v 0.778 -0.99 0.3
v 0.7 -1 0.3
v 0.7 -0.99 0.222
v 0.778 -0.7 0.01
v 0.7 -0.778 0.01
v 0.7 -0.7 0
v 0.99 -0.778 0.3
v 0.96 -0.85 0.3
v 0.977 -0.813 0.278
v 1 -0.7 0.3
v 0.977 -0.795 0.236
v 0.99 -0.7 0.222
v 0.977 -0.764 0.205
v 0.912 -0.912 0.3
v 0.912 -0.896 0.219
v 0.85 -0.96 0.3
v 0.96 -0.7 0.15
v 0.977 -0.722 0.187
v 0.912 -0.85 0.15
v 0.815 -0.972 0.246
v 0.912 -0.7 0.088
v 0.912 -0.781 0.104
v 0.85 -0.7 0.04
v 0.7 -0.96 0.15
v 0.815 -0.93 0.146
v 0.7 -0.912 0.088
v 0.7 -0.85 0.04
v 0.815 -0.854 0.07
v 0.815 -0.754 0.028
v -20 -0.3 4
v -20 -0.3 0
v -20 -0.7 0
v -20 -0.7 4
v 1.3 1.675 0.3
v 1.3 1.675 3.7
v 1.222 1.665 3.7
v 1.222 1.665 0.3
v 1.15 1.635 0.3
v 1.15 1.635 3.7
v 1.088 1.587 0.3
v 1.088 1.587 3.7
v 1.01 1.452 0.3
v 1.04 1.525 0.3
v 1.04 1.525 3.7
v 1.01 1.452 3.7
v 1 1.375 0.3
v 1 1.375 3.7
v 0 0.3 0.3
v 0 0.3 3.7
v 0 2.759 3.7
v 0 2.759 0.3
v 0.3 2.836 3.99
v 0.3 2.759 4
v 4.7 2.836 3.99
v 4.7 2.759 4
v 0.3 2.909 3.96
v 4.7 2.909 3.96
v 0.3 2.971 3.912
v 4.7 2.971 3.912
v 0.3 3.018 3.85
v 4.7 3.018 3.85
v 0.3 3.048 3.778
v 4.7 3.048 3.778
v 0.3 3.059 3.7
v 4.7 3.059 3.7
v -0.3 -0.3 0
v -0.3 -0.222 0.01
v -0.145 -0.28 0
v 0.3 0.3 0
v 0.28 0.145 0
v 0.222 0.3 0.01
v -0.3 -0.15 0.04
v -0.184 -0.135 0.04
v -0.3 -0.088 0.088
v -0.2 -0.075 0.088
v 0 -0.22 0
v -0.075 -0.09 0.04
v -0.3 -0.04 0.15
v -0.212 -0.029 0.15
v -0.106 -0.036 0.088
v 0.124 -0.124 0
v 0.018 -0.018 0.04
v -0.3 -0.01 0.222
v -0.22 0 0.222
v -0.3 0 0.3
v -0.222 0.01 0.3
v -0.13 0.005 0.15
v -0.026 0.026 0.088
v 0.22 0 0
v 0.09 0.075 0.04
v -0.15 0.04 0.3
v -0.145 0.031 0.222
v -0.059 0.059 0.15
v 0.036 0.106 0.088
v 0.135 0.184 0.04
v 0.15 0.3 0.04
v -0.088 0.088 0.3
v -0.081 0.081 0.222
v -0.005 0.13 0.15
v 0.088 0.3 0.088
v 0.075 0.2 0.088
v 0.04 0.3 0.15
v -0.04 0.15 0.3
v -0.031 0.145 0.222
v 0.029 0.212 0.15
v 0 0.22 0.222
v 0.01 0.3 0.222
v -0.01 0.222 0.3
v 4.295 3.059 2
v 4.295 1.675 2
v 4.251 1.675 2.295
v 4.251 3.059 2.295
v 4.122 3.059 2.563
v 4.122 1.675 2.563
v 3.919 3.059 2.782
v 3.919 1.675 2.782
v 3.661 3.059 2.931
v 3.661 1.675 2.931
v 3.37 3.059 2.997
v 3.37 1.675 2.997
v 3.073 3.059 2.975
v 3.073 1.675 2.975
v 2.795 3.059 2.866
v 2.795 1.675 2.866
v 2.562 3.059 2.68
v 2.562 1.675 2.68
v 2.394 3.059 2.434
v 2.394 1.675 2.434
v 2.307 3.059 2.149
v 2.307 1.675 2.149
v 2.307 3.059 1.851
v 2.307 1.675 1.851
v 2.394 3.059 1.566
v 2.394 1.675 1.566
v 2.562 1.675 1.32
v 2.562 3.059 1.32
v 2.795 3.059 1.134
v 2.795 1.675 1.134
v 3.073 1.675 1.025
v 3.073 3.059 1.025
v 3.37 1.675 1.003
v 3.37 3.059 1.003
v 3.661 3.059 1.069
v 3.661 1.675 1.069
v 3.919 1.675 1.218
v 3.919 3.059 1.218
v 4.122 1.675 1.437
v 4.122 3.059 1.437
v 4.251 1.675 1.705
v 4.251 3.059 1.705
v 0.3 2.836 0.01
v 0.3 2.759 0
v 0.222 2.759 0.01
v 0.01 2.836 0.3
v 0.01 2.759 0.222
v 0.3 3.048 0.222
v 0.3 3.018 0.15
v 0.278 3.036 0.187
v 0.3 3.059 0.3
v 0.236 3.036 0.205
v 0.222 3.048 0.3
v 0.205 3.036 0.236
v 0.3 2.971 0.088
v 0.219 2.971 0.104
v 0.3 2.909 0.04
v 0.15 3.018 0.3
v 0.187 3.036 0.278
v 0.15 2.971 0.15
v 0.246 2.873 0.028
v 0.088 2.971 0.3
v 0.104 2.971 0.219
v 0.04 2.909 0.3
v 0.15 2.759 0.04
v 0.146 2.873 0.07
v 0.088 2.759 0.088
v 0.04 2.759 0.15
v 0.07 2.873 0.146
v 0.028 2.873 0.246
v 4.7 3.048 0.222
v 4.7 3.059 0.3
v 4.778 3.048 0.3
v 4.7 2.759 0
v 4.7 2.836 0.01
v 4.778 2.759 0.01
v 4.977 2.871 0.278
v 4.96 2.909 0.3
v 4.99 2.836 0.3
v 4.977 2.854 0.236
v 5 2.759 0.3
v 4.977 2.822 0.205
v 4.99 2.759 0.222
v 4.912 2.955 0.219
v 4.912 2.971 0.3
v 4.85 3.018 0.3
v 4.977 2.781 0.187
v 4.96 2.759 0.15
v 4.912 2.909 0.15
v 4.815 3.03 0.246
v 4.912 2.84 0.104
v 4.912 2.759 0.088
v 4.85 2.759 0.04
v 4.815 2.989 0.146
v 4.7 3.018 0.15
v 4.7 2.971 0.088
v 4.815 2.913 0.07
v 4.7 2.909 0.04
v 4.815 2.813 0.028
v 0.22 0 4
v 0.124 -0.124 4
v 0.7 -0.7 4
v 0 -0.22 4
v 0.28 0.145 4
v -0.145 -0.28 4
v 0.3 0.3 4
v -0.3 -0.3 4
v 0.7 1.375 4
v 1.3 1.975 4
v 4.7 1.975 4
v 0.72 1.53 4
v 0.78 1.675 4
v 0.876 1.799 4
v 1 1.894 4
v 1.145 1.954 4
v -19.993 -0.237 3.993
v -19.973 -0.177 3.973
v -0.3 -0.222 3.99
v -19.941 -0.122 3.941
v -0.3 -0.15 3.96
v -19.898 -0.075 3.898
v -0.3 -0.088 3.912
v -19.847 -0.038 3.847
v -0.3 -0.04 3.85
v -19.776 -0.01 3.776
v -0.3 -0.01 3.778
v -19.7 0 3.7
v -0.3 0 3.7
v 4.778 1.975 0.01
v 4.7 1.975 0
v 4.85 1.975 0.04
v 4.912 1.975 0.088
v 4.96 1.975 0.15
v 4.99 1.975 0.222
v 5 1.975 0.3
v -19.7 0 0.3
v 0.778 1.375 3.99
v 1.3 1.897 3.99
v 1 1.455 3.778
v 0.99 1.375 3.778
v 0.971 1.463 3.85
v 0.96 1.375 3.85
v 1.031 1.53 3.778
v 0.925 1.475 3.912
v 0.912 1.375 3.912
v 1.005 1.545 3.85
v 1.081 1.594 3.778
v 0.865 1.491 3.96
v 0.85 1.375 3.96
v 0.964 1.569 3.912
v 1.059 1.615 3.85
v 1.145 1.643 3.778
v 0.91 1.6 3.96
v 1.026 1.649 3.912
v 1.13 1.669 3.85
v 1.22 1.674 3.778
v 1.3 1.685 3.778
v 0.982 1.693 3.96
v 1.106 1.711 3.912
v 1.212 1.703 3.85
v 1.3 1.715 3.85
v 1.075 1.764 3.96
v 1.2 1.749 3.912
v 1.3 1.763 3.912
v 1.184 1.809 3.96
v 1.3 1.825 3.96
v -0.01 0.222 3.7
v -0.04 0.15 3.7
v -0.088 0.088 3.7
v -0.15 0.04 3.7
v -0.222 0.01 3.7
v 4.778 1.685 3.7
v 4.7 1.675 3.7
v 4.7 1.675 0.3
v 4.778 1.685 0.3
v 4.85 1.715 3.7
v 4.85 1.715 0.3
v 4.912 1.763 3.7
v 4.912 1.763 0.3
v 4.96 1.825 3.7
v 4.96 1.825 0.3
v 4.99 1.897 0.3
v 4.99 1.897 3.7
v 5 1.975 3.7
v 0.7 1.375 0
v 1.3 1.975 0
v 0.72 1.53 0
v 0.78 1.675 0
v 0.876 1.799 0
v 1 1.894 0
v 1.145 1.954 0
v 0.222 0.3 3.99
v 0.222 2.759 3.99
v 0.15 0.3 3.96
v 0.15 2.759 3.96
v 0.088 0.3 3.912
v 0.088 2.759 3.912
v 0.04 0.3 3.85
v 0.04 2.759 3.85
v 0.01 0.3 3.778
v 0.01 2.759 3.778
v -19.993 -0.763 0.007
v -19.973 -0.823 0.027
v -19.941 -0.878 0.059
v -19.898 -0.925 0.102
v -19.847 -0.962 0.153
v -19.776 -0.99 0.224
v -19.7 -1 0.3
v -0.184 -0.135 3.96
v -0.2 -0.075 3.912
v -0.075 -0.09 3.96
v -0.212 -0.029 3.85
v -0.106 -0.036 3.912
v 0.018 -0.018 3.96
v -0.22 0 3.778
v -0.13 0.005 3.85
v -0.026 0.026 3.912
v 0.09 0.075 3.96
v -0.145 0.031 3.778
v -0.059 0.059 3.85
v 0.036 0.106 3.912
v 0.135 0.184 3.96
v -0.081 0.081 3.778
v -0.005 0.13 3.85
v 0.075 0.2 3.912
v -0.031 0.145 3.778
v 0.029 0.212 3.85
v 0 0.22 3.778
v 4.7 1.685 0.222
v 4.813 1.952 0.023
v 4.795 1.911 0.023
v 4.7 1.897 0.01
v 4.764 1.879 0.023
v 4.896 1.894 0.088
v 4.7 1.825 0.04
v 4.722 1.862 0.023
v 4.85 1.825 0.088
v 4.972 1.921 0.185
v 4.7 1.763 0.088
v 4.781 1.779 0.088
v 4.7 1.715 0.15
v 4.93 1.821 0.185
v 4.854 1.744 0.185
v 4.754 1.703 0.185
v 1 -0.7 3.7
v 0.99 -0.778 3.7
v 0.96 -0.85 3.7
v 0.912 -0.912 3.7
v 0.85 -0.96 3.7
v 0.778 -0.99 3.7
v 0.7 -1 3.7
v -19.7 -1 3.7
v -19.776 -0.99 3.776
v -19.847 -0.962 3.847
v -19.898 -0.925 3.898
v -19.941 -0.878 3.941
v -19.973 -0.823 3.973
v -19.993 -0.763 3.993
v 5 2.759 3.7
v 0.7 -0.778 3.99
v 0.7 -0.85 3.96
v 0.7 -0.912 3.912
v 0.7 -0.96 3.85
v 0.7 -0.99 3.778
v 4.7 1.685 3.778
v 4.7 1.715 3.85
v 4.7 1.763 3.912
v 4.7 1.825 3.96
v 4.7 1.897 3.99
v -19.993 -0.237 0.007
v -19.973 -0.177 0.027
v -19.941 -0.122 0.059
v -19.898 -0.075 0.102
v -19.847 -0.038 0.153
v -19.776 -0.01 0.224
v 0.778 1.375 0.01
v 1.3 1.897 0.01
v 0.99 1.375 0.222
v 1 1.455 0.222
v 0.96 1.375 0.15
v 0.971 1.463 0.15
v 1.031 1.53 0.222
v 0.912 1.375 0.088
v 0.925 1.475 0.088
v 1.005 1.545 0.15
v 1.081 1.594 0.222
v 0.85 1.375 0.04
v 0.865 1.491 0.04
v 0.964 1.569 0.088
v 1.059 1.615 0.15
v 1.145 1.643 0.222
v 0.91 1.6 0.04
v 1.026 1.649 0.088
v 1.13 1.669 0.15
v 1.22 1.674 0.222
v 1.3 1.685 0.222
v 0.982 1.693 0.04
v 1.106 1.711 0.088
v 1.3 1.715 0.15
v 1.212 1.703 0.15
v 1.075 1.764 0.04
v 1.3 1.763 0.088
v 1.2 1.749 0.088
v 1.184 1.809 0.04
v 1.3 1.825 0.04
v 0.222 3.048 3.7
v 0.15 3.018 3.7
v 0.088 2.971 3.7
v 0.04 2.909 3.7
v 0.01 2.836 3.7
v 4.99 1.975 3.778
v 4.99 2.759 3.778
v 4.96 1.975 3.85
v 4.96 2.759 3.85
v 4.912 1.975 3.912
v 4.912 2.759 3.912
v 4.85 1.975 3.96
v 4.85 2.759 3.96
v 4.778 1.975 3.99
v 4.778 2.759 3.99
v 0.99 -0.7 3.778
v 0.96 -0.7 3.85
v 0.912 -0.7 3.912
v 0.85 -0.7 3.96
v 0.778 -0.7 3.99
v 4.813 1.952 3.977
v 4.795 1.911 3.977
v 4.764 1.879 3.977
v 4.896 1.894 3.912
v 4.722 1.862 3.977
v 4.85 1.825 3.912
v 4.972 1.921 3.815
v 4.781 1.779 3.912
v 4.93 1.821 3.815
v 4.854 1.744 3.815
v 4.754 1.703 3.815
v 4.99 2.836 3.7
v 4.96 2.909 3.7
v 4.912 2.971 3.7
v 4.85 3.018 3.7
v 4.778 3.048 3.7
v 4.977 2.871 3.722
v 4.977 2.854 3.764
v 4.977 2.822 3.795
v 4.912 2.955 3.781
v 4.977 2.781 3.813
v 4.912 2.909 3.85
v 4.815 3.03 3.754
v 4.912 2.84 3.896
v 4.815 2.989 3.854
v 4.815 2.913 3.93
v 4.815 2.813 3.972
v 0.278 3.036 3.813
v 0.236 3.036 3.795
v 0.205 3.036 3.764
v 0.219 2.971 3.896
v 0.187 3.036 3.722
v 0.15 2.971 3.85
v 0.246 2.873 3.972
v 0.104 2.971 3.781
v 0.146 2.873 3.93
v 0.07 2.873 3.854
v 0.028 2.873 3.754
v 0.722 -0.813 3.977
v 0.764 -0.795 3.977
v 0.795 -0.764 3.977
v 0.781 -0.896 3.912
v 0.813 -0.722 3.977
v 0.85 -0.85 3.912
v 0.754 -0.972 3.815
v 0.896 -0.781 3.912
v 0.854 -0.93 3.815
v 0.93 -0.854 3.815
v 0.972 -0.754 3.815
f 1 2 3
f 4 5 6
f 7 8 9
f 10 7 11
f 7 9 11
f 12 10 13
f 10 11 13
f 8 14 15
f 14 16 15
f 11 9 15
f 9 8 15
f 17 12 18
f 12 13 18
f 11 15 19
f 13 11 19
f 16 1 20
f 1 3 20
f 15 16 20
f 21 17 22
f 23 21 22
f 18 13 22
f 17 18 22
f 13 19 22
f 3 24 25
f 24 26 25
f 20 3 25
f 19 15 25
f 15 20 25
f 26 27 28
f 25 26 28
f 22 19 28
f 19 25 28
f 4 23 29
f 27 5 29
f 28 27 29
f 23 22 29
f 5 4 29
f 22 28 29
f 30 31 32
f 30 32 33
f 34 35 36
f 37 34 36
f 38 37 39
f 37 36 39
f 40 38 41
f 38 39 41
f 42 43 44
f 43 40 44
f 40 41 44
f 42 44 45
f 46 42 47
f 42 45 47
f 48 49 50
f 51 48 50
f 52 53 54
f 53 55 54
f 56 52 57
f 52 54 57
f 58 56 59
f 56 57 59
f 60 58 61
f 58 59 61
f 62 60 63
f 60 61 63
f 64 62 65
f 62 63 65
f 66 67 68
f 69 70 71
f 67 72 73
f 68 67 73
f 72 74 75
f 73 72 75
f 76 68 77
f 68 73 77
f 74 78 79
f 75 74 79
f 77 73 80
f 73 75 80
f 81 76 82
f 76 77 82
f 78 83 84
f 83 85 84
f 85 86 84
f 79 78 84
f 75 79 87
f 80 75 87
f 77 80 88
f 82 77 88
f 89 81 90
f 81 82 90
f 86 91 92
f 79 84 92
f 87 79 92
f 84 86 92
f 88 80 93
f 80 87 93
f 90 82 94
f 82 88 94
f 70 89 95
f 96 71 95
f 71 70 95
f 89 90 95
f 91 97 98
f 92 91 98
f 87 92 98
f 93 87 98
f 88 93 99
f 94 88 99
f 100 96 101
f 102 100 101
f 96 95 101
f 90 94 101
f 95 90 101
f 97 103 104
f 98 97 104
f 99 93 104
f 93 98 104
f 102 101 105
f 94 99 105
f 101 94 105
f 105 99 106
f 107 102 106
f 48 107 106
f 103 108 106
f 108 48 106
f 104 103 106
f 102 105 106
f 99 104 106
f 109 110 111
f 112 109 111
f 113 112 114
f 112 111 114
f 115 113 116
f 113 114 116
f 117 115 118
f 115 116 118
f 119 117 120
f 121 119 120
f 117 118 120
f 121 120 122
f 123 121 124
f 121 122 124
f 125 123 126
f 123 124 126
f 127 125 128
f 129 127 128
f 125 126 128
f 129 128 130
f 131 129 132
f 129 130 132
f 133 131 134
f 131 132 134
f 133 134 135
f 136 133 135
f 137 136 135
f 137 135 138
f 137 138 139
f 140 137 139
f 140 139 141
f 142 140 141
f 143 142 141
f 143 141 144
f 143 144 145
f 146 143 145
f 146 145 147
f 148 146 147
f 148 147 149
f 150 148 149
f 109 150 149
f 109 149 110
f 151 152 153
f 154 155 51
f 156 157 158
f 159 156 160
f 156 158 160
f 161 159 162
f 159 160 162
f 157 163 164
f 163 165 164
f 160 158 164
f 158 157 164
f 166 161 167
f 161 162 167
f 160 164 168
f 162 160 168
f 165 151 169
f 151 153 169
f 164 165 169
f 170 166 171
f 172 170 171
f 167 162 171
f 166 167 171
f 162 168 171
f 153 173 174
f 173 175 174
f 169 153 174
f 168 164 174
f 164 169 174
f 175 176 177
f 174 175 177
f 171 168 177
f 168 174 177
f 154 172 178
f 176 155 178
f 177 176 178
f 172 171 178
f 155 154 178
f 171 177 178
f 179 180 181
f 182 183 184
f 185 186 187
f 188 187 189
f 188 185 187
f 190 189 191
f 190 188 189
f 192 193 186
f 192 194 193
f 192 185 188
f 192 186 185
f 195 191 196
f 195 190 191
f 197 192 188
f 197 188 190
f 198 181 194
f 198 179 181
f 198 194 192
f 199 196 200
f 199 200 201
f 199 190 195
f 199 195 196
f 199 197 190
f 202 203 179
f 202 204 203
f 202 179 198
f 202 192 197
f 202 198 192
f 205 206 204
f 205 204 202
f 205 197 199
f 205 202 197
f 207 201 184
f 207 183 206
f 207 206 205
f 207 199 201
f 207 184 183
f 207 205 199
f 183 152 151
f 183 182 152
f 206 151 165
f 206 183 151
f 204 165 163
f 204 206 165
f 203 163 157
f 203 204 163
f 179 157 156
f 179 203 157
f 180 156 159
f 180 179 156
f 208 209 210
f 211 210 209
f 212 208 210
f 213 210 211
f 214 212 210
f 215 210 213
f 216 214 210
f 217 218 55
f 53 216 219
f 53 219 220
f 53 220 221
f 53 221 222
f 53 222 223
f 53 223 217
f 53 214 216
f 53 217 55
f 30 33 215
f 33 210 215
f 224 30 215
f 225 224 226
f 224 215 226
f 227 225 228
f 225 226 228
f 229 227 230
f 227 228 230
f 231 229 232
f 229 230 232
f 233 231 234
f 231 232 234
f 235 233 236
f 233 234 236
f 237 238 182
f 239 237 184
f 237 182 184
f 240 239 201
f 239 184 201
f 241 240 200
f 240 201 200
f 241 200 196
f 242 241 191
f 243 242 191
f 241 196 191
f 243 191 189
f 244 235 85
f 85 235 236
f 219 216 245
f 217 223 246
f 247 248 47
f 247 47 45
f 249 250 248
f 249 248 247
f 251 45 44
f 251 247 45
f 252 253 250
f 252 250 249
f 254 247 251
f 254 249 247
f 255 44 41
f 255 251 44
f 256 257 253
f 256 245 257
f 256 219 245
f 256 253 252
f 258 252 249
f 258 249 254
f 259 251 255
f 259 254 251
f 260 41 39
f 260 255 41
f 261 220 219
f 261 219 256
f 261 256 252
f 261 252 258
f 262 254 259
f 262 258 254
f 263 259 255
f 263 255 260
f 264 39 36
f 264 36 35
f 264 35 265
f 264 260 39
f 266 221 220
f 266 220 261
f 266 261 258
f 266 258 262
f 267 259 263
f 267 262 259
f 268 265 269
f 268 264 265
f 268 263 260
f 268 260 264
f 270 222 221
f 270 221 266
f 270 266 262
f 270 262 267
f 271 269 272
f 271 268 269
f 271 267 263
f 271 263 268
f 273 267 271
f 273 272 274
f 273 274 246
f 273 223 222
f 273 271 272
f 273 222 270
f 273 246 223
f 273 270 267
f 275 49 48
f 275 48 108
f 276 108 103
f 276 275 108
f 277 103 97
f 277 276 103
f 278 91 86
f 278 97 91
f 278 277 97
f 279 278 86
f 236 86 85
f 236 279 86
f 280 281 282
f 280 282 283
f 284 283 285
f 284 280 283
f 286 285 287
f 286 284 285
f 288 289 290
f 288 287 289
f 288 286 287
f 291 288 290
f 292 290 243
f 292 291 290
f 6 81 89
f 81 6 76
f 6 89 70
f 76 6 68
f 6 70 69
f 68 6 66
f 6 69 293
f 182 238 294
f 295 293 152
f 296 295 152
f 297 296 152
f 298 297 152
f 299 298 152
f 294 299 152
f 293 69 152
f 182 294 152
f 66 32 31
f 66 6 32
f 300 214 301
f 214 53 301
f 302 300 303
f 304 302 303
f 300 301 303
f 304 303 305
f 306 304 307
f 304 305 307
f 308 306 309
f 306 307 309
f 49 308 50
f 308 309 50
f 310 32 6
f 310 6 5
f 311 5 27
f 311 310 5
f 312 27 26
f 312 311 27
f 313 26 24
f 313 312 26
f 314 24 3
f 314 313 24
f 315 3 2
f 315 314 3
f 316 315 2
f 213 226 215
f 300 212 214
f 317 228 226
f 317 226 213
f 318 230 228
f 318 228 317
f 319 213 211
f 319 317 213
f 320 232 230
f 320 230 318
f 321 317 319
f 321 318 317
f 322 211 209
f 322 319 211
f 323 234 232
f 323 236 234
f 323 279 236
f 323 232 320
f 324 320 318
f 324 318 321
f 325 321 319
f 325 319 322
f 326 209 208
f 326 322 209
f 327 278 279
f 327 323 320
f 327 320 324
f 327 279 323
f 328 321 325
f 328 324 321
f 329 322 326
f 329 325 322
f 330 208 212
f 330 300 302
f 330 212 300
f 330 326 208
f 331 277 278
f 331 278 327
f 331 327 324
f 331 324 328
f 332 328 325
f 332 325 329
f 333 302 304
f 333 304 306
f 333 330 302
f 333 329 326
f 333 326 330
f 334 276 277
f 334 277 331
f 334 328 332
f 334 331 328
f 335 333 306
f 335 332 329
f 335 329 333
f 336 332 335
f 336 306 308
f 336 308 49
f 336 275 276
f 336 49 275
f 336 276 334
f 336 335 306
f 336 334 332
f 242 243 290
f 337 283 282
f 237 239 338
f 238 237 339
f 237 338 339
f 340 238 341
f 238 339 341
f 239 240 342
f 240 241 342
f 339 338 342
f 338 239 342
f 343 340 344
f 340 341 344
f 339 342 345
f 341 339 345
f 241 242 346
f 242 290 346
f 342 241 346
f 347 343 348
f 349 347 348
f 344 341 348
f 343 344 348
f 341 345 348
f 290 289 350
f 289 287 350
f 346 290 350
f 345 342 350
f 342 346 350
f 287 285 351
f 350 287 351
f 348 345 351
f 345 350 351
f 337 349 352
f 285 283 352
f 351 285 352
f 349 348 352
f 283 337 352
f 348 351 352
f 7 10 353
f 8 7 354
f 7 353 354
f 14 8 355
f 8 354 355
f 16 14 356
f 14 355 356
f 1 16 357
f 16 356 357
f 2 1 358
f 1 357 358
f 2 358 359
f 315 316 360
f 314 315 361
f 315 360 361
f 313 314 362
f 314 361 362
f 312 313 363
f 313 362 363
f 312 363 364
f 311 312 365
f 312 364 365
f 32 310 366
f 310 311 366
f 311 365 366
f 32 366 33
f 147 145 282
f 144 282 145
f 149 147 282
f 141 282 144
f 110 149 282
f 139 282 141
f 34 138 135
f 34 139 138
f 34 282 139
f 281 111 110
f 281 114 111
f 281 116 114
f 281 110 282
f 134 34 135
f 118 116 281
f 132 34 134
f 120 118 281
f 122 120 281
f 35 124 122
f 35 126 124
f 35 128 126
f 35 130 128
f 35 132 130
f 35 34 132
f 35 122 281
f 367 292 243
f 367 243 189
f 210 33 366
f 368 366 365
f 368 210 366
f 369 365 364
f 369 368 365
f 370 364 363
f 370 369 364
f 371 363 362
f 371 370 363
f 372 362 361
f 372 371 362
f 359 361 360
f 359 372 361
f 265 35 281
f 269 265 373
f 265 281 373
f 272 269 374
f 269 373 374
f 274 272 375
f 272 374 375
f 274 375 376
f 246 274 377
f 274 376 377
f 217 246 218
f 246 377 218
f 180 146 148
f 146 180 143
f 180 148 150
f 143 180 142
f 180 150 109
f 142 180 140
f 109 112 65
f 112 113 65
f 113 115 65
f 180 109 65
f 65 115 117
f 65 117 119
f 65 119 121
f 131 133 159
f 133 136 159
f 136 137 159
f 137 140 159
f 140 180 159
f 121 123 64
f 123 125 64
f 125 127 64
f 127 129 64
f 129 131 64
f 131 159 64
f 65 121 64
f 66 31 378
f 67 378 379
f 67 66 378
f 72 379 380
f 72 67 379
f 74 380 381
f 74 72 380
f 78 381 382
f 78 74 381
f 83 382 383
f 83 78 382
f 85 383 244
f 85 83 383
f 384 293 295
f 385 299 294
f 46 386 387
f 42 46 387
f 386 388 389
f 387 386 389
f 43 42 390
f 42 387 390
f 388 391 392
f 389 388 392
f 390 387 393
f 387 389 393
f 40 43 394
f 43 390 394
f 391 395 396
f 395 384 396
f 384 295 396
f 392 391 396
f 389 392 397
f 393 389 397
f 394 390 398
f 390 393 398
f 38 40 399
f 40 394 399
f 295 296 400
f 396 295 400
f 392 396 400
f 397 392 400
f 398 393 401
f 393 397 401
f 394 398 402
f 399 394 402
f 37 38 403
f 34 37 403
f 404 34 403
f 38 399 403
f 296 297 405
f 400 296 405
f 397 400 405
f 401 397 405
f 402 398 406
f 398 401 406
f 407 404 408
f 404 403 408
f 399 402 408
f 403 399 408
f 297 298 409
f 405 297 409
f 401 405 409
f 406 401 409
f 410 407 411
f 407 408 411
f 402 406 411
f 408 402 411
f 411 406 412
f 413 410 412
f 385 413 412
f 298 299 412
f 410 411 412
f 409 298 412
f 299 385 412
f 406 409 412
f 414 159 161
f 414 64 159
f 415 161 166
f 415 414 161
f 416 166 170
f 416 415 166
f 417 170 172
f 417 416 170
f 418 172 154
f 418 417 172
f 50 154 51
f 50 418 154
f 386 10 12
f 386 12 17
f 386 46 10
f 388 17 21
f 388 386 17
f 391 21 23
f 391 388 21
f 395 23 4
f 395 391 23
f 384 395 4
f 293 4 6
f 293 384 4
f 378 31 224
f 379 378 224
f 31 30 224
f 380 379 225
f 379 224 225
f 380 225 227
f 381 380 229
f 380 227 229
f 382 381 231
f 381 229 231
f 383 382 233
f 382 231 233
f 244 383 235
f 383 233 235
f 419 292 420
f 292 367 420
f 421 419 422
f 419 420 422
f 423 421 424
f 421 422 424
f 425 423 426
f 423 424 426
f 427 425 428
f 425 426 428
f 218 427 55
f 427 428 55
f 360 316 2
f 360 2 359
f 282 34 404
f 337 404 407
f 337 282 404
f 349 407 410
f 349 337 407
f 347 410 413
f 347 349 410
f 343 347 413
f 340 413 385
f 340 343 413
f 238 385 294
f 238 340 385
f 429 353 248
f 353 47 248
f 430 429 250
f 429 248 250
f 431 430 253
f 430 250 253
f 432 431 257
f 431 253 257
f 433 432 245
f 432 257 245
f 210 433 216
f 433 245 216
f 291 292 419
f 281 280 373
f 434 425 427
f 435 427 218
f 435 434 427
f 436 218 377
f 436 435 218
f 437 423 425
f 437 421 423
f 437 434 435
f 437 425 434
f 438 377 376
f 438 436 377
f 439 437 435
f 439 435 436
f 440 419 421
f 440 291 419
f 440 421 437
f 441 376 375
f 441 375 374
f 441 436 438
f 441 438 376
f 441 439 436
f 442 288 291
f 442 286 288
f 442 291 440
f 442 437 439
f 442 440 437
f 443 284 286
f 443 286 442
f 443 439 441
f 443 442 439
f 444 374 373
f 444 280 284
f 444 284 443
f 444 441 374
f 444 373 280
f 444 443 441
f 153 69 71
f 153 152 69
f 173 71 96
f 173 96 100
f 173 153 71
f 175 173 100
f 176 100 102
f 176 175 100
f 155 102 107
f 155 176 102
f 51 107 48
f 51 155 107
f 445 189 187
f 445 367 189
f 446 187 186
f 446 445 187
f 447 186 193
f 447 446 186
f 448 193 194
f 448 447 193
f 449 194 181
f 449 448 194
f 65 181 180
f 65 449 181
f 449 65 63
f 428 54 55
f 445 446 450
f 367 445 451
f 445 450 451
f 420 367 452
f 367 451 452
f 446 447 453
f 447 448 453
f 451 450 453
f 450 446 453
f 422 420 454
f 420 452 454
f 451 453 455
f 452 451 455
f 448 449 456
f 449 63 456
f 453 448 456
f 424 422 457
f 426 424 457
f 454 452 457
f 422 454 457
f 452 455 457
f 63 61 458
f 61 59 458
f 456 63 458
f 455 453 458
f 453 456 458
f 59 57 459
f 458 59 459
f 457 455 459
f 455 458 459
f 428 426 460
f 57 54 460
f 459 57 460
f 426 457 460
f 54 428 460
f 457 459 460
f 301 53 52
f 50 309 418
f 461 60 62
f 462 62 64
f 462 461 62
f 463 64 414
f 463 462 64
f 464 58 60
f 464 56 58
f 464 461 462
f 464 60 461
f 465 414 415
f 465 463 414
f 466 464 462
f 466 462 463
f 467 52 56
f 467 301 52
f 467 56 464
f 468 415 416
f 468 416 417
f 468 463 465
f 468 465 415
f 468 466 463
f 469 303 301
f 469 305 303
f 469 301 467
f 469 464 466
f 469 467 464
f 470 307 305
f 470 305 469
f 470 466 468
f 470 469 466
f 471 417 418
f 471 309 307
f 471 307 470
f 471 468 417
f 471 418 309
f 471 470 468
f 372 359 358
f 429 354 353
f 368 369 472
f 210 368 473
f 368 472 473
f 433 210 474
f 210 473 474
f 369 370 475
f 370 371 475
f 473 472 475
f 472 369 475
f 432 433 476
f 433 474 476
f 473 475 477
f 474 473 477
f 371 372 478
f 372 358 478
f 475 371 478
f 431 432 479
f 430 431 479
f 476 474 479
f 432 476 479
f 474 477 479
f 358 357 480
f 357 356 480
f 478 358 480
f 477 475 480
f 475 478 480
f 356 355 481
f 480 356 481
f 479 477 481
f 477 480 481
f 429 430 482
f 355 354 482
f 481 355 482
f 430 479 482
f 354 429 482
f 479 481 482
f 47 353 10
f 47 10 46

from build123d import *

# Parameters (mm, degrees)
F0_W     = 20
F0_H     = 4
F1_DEPTH = 1
F2_W     = 3.0585520435
F2_H     = 4
F2_W_2   = 1
F3_DEPTH = 1
F4_W     = 1.3837967999
F4_H     = 4
F5_DEPTH = 4
F6_R     = 1
F7_DEPTH = 2
F8_F1_R  = 0.3
F8_F2_R  = 0.3


with BuildPart() as f1:
    # F0 (on Front) → F1 (new body)
    with BuildSketch(Plane.XZ):
        with Locations((-10, 2)):
            Rectangle(F0_W, F0_H)
    extrude(amount=F1_DEPTH)

    # F2 (on face) → F3 (join)
    with BuildSketch(Plane.YZ):
        with Locations((1.5292760218, 2)):
            Rectangle(F2_W, F2_H)
        with Locations((-0.5, 2)):
            Rectangle(F2_W_2, F2_H)
    extrude(amount=F3_DEPTH)

    # F4 (on face) → F5 (join)
    with BuildSketch(Plane.YZ.offset(1)):
        with Locations((2.3666536435, 2)):
            Rectangle(F4_W, F4_H)
    extrude(amount=F5_DEPTH)

    # F6 (on face) → F7 (cut)
    with BuildSketch(Plane.XZ.offset(-1.6747552436)):
        with Locations((3.2954369672, 2)):
            Circle(F6_R)
    extrude(amount=-F7_DEPTH, mode=Mode.SUBTRACT)

    # F8: fillet of radius 0.3 on 18 edges, made by hand

    # F8_f1
    f8_f1_edges = [f1.edges().sort_by_distance(p)[0] for p in [
        (0, 0, 2),
        (1, 1.6747552436, 2),
    ]]
    fillet(f8_f1_edges, radius=F8_F1_R)

    # F8_f2
    f8_f2_edges = [f1.edges().sort_by_distance(p)[0] for p in [
        (-9.5, -1, 0),
        (1, -1, 2),
        (-9.5, -1, 4),
        (-20, -1, 2),
        (-10.15, 0, 0),
        (-10.15, 0, 4),
        (-20, 0, 2),
        (2.5, 3.0585520435, 0),
        (2.5, 3.0585520435, 4),
        (5, 3.0585520435, 2),
        (0, 3.0585520435, 2),
        (5, 1.6747552436, 2),
        (5, 2.3666536435, 0),
        (5, 2.3666536435, 4),
        (3.15, 1.6747552436, 0),
        (3.15, 1.6747552436, 4),
        (1.0878679656, 1.5868872779, 4),
        (1.0878679656, 1.5868872779, 0),
        (-0.0878679656, 0.0878679656, 4),
        (-0.0878679656, 0.0878679656, 0),
    ]]
    fillet(f8_f2_edges, radius=F8_F2_R)


solid = f1.part
